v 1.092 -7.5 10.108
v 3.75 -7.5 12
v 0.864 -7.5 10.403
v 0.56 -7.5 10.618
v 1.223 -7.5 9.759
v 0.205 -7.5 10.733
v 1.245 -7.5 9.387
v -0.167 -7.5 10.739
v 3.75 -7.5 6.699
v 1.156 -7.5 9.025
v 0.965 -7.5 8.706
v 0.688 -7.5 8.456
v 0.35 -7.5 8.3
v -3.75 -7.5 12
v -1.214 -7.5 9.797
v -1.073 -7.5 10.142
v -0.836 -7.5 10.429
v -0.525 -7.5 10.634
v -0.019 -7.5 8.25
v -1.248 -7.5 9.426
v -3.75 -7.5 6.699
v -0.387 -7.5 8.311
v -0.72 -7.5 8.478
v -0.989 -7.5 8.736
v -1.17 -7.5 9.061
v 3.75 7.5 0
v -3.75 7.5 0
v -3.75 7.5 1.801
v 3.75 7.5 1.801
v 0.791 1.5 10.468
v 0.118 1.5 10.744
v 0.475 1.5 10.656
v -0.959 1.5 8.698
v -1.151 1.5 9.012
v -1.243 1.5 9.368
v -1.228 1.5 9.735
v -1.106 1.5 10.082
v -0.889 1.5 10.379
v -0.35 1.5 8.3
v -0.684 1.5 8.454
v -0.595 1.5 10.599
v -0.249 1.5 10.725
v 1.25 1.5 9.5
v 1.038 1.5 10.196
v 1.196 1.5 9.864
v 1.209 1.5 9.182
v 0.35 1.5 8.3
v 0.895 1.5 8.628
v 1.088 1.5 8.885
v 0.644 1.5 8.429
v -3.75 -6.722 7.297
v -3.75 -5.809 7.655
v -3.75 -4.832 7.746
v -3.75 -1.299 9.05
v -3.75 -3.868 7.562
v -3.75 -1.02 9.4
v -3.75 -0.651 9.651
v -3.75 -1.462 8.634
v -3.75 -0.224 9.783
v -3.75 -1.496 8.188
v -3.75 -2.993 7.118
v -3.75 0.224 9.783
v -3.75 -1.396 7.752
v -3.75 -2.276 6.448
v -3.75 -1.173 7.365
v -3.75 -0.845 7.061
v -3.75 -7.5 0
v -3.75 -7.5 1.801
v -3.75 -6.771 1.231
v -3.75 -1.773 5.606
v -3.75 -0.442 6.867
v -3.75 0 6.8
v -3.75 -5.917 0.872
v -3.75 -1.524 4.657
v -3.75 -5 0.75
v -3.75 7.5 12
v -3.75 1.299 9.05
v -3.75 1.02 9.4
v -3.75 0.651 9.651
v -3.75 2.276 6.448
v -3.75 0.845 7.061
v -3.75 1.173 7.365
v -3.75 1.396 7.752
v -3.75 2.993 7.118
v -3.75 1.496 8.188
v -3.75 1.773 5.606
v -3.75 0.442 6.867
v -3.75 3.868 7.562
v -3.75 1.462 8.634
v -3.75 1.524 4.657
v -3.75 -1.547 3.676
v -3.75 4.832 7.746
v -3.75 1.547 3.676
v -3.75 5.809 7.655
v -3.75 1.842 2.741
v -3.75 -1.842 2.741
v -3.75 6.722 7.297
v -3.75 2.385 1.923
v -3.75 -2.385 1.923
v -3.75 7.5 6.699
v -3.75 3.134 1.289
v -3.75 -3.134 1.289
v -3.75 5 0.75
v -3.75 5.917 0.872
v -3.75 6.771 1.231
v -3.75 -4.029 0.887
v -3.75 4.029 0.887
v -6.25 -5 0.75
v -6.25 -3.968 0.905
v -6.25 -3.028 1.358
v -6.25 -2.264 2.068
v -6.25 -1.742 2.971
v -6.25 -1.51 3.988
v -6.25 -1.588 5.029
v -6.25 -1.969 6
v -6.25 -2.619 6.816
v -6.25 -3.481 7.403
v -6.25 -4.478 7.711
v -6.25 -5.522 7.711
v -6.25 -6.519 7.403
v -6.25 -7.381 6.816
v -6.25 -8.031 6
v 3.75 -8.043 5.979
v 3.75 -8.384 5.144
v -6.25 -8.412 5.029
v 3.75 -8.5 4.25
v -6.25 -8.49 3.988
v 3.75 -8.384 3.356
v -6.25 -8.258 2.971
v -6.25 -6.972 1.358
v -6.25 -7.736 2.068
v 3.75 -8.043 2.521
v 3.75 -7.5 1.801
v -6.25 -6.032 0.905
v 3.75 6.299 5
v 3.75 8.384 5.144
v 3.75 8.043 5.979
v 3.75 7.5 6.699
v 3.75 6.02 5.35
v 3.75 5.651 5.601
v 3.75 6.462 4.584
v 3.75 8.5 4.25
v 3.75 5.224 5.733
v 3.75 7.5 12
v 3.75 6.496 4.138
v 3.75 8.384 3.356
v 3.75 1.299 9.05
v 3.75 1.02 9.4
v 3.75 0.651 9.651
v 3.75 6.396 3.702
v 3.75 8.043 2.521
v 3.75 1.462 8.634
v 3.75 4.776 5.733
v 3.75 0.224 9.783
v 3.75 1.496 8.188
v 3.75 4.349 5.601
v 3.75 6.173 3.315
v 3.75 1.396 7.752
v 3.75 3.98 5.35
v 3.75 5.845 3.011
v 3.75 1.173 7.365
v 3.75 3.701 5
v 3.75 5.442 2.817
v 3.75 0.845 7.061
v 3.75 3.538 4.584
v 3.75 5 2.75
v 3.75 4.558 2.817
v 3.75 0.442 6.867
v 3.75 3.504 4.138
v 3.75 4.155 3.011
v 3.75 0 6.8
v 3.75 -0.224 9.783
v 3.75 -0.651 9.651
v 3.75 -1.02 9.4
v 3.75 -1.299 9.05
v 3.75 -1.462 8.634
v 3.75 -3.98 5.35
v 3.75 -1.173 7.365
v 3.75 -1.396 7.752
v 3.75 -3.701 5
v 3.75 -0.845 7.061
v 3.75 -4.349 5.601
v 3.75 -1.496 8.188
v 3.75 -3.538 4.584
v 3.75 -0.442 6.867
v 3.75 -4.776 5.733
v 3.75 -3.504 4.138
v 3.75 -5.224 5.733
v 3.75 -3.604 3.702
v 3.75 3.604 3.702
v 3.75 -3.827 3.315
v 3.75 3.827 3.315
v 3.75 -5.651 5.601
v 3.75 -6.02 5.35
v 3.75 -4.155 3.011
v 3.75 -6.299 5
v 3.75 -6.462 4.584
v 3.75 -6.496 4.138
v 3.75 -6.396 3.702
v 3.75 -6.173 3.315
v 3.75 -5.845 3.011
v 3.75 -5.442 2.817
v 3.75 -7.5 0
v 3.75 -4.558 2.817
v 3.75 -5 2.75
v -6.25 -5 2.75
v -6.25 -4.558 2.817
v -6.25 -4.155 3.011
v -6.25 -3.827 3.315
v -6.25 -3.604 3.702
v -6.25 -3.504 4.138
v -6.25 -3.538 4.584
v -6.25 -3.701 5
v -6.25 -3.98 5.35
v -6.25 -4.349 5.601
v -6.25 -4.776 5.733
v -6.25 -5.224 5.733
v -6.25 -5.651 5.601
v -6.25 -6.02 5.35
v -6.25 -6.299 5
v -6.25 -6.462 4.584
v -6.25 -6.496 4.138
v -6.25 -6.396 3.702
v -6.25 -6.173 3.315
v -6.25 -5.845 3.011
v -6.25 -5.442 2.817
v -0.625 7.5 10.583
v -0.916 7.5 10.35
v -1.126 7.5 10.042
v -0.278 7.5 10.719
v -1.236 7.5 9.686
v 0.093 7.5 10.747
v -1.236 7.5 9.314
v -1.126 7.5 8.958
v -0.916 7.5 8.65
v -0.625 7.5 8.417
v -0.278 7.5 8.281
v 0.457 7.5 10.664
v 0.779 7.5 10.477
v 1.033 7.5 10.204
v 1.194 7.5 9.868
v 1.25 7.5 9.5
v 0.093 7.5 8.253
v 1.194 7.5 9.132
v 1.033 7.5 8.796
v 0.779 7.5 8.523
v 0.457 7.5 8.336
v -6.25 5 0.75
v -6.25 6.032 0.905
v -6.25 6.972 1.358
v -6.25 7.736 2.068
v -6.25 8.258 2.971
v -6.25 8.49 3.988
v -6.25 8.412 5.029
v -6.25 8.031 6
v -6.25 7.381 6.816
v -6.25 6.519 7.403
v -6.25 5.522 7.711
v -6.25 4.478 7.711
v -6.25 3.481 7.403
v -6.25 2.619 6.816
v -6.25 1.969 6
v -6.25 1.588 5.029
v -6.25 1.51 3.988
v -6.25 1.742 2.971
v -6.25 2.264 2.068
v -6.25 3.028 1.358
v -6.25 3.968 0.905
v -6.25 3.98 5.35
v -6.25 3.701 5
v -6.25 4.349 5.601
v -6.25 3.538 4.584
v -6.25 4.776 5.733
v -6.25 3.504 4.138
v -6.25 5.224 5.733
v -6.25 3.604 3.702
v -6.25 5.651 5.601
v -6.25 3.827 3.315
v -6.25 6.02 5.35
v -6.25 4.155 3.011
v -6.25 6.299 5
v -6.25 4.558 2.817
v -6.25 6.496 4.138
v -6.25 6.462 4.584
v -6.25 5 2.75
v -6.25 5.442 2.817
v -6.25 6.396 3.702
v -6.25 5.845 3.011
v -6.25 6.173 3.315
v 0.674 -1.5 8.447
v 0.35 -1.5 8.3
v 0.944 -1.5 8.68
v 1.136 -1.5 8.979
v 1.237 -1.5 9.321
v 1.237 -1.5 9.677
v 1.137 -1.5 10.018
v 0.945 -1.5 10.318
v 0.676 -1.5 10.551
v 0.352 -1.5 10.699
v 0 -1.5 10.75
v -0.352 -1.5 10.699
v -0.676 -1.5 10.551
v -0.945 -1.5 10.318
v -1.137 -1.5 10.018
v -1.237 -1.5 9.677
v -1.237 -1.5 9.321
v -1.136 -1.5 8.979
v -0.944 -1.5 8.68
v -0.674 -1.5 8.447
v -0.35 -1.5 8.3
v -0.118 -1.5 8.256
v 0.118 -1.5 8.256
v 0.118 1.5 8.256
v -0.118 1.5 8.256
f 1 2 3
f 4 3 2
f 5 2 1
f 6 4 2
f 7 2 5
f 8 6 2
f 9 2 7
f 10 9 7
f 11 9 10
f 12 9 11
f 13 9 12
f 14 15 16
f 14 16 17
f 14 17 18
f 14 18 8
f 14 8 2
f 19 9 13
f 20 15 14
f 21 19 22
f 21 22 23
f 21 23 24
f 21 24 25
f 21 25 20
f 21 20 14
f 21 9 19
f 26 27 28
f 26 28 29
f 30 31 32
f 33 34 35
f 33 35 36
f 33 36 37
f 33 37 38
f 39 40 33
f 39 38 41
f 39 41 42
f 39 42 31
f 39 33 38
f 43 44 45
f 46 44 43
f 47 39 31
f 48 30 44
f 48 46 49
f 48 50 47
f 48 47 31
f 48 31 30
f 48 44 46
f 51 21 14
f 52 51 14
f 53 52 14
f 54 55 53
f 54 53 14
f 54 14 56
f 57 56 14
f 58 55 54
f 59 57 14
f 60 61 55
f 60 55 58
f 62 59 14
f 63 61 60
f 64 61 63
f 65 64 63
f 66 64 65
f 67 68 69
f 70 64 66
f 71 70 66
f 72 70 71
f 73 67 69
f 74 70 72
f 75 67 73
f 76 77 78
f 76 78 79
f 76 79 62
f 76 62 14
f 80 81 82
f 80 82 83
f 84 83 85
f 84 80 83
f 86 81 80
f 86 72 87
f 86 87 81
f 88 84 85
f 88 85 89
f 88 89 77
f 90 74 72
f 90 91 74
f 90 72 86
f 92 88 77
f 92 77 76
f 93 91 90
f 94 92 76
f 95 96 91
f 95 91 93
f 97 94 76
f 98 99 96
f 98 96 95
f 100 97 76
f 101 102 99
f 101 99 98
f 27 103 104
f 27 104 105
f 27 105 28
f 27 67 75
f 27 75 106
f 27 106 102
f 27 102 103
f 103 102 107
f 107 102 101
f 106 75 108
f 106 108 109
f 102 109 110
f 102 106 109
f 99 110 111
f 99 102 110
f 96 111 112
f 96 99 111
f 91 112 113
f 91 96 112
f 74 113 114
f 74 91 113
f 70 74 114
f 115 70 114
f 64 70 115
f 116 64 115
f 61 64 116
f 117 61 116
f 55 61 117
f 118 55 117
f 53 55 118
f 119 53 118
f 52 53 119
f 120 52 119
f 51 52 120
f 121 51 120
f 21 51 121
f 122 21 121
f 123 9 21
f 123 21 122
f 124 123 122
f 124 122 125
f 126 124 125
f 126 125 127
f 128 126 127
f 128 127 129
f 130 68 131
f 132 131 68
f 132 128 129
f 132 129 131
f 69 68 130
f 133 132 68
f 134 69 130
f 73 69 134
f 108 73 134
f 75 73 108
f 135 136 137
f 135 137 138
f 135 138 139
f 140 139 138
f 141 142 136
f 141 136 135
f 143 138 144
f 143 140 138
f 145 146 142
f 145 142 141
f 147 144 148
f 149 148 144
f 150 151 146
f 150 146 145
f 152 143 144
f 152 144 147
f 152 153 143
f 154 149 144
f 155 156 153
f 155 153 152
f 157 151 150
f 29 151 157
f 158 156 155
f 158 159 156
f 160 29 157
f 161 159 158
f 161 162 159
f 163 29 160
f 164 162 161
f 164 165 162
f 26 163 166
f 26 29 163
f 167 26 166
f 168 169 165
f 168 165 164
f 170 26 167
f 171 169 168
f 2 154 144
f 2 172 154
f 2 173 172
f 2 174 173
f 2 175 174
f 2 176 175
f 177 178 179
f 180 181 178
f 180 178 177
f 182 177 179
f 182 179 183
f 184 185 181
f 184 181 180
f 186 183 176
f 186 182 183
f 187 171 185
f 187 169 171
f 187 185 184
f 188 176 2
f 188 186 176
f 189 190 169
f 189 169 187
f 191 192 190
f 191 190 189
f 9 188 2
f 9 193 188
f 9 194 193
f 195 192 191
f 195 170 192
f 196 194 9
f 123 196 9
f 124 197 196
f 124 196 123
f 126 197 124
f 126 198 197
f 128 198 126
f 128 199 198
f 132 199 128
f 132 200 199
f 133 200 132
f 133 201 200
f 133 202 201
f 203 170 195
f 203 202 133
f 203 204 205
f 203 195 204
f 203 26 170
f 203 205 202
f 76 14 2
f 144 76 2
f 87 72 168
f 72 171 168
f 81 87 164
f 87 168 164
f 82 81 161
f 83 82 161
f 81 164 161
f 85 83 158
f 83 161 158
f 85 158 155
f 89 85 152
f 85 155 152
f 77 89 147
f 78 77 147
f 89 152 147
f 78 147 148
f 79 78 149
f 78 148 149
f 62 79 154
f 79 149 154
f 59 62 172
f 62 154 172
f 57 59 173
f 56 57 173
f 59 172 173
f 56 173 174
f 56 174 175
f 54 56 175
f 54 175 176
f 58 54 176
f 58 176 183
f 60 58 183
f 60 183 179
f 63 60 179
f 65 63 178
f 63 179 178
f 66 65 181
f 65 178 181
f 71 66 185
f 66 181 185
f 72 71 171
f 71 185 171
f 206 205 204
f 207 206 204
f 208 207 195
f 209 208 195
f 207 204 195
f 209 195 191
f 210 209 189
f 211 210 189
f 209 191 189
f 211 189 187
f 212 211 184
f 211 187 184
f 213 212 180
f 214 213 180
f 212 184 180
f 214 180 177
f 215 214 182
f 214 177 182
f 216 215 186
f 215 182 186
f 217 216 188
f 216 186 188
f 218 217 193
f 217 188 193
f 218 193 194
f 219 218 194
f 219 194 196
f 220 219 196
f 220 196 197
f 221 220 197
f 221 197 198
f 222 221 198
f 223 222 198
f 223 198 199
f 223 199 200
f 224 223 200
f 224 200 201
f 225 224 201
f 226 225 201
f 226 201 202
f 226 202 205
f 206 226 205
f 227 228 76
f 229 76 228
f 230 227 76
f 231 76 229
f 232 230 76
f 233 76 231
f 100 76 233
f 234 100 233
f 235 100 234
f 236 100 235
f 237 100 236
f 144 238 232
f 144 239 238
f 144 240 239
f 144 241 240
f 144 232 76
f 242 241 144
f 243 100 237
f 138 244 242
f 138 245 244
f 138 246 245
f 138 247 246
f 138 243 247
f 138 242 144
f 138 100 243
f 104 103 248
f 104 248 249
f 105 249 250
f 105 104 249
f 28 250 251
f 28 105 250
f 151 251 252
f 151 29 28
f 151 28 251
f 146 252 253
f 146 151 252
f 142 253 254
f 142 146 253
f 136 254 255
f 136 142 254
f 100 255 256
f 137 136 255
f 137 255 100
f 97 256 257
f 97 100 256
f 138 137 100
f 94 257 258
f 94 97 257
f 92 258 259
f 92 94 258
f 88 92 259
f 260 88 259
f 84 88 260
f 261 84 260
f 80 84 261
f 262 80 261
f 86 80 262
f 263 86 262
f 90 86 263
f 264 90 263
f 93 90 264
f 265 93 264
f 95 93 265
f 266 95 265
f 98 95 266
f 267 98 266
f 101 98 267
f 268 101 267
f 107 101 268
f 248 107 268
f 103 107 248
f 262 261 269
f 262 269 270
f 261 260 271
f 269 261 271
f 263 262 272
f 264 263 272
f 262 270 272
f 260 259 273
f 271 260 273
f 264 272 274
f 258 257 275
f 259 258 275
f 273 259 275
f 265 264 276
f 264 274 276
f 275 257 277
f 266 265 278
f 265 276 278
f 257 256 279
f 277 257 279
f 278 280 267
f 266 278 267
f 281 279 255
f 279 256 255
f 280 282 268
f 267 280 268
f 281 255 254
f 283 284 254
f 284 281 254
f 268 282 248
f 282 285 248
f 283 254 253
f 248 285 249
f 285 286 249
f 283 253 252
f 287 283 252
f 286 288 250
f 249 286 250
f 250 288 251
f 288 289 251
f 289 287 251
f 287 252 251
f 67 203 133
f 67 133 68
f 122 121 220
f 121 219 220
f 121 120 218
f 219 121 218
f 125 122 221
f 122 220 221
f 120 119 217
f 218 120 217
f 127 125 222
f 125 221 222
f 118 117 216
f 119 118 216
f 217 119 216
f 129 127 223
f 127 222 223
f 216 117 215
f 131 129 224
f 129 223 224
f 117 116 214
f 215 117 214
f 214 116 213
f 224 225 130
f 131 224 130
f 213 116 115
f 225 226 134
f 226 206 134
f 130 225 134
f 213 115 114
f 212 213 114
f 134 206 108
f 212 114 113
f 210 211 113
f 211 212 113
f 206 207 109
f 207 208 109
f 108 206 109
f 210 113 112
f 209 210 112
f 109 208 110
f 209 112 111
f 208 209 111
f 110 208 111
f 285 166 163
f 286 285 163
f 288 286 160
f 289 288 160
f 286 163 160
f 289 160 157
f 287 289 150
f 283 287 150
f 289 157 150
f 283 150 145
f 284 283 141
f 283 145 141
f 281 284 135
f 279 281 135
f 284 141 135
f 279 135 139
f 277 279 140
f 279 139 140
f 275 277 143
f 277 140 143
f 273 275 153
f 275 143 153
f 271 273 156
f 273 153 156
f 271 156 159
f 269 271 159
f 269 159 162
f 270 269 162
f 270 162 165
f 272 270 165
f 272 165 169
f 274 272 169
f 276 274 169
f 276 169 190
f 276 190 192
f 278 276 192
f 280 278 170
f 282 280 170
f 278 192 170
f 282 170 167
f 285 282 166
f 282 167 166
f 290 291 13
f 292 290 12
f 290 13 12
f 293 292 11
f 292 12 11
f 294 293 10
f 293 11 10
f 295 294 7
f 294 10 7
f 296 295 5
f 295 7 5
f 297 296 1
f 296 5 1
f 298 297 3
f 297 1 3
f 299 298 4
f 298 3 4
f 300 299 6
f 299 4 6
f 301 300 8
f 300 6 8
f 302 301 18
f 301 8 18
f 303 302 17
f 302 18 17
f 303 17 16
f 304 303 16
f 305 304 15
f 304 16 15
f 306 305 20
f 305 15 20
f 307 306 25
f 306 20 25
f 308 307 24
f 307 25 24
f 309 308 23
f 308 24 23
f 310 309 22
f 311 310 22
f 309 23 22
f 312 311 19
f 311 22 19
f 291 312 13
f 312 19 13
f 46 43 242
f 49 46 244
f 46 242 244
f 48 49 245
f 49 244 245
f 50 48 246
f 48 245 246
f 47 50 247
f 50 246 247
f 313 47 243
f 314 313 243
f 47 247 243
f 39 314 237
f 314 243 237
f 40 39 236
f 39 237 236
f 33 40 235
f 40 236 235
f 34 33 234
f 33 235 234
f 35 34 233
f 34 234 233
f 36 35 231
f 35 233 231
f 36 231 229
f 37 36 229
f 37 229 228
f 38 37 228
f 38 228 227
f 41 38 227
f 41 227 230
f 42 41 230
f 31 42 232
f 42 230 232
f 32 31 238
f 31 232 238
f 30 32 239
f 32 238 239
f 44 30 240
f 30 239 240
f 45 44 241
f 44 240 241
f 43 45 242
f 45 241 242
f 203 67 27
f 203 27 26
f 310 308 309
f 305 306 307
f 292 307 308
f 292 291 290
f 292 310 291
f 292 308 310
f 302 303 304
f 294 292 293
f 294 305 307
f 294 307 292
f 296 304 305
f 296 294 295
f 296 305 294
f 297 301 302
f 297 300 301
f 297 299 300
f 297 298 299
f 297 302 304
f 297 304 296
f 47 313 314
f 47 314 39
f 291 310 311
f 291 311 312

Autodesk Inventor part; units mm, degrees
ref_plane "YZ Plane" through (0, 0, 0) normal (1, 0, 0) x (0, 1, 0)
ref_plane "XZ Plane" through (0, 0, 0) normal (0, 1, 0) x (-1, 0, 0)
ref_plane "XY Plane" through (0, 0, 0) normal (0, 0, 1) x (1, 0, 0)
sketch "スケッチ1" plane through (0, 0, 0) normal (1, 0, 0) x (0, 1, 0)
  point P0 (0, 0)
sketch "スケッチ2" plane through (0, 0, 0) normal (0, 0, 1) x (1, 0, 0)
  line L0 (-3.75, 7.5) -> (3.75, 7.5)
  line L1 (3.75, 7.5) -> (3.75, -7.5)
  line L2 (3.75, -7.5) -> (-3.75, -7.5)
  line L3 (-3.75, -7.5) -> (-3.75, 7.5)
  line L4 (-3.75, 7.5) -> (3.75, -7.5) construction
  line L5 (3.75, 7.5) -> (-3.75, -7.5) construction
  point P0 (0, 0)
  dimension "d0" = 7.5
  dimension "d1" = 15
extrude "押し出し1" add sketch "スケッチ2" along normal blind 12
sketch "スケッチ3" plane through (-3.75, 7.5, 0) normal (0, 1, 0) x (1, 0, 0)
  circle A0 centre (3.75, -9.5) radius 1.25
  point P0 (3.75, 0)
  dimension "d4" = 2.5
extrude "押し出し2" cut sketch "スケッチ3" against normal blind 6
sketch "スケッチ4" plane through (3.75, -7.5, 0) normal (1, 0, 0) x (0, 0, -1)
  circle A0 centre (-8.3, 7.5) radius 1.5
  point P0 (0, 7.5)
  dimension "d7" = 3
extrude "押し出し3" cut sketch "スケッチ4" against normal blind 20
sketch "スケッチ5" plane through (3.75, -7.5, 0) normal (1, 0, 0) x (0, 0, -1)
  circle A0 centre (-4.25, 2.5) radius 1.5
  circle A1 centre (-4.25, 12.5) radius 1.5
  point P0 (0, 7.5)
  dimension "d10" = 3
  dimension "d11" = 3
extrude "押し出し4" cut sketch "スケッチ5" against normal blind 20
sketch "スケッチ6" plane through (3.75, -7.5, 0) normal (1, 0, 0) x (0, 0, -1)
  circle A0 centre (-4.25, 2.5) radius 1.5 projected
  circle A1 centre (-4.25, 2.5) radius 3.5
  circle A2 centre (-4.25, 12.5) radius 1.5 projected
  circle A3 centre (-4.25, 12.5) radius 3.5
  point P0 (0, 7.5)
  dimension "d14" = 7
  dimension "d15" = 7
extrude "押し出し5" add sketch "スケッチ6" against normal blind 10
sketch "スケッチ7" plane through (-3.75, -7.5, 12) normal (0, -1, 0) x (1, 0, 0)
  arc A0 (4.1, -3.7) -> (3.4, -3.7) centre (3.75, -2.5) ccw projected
  circle A1 centre (3.75, -2.5) radius 1.25
  point P0 (3.75, -12)
extrude "押し出し6" cut sketch "スケッチ7" against normal blind 6
thread "ねじ1" size "M2.5x0.45" class "6H" standard "ANSI Metric M Profile" full length
thread "ねじ2" size "M2.5x0.45" class "6H" standard "ANSI Metric M Profile" full length
properties part number "moving_part" material "アルミニウム"
